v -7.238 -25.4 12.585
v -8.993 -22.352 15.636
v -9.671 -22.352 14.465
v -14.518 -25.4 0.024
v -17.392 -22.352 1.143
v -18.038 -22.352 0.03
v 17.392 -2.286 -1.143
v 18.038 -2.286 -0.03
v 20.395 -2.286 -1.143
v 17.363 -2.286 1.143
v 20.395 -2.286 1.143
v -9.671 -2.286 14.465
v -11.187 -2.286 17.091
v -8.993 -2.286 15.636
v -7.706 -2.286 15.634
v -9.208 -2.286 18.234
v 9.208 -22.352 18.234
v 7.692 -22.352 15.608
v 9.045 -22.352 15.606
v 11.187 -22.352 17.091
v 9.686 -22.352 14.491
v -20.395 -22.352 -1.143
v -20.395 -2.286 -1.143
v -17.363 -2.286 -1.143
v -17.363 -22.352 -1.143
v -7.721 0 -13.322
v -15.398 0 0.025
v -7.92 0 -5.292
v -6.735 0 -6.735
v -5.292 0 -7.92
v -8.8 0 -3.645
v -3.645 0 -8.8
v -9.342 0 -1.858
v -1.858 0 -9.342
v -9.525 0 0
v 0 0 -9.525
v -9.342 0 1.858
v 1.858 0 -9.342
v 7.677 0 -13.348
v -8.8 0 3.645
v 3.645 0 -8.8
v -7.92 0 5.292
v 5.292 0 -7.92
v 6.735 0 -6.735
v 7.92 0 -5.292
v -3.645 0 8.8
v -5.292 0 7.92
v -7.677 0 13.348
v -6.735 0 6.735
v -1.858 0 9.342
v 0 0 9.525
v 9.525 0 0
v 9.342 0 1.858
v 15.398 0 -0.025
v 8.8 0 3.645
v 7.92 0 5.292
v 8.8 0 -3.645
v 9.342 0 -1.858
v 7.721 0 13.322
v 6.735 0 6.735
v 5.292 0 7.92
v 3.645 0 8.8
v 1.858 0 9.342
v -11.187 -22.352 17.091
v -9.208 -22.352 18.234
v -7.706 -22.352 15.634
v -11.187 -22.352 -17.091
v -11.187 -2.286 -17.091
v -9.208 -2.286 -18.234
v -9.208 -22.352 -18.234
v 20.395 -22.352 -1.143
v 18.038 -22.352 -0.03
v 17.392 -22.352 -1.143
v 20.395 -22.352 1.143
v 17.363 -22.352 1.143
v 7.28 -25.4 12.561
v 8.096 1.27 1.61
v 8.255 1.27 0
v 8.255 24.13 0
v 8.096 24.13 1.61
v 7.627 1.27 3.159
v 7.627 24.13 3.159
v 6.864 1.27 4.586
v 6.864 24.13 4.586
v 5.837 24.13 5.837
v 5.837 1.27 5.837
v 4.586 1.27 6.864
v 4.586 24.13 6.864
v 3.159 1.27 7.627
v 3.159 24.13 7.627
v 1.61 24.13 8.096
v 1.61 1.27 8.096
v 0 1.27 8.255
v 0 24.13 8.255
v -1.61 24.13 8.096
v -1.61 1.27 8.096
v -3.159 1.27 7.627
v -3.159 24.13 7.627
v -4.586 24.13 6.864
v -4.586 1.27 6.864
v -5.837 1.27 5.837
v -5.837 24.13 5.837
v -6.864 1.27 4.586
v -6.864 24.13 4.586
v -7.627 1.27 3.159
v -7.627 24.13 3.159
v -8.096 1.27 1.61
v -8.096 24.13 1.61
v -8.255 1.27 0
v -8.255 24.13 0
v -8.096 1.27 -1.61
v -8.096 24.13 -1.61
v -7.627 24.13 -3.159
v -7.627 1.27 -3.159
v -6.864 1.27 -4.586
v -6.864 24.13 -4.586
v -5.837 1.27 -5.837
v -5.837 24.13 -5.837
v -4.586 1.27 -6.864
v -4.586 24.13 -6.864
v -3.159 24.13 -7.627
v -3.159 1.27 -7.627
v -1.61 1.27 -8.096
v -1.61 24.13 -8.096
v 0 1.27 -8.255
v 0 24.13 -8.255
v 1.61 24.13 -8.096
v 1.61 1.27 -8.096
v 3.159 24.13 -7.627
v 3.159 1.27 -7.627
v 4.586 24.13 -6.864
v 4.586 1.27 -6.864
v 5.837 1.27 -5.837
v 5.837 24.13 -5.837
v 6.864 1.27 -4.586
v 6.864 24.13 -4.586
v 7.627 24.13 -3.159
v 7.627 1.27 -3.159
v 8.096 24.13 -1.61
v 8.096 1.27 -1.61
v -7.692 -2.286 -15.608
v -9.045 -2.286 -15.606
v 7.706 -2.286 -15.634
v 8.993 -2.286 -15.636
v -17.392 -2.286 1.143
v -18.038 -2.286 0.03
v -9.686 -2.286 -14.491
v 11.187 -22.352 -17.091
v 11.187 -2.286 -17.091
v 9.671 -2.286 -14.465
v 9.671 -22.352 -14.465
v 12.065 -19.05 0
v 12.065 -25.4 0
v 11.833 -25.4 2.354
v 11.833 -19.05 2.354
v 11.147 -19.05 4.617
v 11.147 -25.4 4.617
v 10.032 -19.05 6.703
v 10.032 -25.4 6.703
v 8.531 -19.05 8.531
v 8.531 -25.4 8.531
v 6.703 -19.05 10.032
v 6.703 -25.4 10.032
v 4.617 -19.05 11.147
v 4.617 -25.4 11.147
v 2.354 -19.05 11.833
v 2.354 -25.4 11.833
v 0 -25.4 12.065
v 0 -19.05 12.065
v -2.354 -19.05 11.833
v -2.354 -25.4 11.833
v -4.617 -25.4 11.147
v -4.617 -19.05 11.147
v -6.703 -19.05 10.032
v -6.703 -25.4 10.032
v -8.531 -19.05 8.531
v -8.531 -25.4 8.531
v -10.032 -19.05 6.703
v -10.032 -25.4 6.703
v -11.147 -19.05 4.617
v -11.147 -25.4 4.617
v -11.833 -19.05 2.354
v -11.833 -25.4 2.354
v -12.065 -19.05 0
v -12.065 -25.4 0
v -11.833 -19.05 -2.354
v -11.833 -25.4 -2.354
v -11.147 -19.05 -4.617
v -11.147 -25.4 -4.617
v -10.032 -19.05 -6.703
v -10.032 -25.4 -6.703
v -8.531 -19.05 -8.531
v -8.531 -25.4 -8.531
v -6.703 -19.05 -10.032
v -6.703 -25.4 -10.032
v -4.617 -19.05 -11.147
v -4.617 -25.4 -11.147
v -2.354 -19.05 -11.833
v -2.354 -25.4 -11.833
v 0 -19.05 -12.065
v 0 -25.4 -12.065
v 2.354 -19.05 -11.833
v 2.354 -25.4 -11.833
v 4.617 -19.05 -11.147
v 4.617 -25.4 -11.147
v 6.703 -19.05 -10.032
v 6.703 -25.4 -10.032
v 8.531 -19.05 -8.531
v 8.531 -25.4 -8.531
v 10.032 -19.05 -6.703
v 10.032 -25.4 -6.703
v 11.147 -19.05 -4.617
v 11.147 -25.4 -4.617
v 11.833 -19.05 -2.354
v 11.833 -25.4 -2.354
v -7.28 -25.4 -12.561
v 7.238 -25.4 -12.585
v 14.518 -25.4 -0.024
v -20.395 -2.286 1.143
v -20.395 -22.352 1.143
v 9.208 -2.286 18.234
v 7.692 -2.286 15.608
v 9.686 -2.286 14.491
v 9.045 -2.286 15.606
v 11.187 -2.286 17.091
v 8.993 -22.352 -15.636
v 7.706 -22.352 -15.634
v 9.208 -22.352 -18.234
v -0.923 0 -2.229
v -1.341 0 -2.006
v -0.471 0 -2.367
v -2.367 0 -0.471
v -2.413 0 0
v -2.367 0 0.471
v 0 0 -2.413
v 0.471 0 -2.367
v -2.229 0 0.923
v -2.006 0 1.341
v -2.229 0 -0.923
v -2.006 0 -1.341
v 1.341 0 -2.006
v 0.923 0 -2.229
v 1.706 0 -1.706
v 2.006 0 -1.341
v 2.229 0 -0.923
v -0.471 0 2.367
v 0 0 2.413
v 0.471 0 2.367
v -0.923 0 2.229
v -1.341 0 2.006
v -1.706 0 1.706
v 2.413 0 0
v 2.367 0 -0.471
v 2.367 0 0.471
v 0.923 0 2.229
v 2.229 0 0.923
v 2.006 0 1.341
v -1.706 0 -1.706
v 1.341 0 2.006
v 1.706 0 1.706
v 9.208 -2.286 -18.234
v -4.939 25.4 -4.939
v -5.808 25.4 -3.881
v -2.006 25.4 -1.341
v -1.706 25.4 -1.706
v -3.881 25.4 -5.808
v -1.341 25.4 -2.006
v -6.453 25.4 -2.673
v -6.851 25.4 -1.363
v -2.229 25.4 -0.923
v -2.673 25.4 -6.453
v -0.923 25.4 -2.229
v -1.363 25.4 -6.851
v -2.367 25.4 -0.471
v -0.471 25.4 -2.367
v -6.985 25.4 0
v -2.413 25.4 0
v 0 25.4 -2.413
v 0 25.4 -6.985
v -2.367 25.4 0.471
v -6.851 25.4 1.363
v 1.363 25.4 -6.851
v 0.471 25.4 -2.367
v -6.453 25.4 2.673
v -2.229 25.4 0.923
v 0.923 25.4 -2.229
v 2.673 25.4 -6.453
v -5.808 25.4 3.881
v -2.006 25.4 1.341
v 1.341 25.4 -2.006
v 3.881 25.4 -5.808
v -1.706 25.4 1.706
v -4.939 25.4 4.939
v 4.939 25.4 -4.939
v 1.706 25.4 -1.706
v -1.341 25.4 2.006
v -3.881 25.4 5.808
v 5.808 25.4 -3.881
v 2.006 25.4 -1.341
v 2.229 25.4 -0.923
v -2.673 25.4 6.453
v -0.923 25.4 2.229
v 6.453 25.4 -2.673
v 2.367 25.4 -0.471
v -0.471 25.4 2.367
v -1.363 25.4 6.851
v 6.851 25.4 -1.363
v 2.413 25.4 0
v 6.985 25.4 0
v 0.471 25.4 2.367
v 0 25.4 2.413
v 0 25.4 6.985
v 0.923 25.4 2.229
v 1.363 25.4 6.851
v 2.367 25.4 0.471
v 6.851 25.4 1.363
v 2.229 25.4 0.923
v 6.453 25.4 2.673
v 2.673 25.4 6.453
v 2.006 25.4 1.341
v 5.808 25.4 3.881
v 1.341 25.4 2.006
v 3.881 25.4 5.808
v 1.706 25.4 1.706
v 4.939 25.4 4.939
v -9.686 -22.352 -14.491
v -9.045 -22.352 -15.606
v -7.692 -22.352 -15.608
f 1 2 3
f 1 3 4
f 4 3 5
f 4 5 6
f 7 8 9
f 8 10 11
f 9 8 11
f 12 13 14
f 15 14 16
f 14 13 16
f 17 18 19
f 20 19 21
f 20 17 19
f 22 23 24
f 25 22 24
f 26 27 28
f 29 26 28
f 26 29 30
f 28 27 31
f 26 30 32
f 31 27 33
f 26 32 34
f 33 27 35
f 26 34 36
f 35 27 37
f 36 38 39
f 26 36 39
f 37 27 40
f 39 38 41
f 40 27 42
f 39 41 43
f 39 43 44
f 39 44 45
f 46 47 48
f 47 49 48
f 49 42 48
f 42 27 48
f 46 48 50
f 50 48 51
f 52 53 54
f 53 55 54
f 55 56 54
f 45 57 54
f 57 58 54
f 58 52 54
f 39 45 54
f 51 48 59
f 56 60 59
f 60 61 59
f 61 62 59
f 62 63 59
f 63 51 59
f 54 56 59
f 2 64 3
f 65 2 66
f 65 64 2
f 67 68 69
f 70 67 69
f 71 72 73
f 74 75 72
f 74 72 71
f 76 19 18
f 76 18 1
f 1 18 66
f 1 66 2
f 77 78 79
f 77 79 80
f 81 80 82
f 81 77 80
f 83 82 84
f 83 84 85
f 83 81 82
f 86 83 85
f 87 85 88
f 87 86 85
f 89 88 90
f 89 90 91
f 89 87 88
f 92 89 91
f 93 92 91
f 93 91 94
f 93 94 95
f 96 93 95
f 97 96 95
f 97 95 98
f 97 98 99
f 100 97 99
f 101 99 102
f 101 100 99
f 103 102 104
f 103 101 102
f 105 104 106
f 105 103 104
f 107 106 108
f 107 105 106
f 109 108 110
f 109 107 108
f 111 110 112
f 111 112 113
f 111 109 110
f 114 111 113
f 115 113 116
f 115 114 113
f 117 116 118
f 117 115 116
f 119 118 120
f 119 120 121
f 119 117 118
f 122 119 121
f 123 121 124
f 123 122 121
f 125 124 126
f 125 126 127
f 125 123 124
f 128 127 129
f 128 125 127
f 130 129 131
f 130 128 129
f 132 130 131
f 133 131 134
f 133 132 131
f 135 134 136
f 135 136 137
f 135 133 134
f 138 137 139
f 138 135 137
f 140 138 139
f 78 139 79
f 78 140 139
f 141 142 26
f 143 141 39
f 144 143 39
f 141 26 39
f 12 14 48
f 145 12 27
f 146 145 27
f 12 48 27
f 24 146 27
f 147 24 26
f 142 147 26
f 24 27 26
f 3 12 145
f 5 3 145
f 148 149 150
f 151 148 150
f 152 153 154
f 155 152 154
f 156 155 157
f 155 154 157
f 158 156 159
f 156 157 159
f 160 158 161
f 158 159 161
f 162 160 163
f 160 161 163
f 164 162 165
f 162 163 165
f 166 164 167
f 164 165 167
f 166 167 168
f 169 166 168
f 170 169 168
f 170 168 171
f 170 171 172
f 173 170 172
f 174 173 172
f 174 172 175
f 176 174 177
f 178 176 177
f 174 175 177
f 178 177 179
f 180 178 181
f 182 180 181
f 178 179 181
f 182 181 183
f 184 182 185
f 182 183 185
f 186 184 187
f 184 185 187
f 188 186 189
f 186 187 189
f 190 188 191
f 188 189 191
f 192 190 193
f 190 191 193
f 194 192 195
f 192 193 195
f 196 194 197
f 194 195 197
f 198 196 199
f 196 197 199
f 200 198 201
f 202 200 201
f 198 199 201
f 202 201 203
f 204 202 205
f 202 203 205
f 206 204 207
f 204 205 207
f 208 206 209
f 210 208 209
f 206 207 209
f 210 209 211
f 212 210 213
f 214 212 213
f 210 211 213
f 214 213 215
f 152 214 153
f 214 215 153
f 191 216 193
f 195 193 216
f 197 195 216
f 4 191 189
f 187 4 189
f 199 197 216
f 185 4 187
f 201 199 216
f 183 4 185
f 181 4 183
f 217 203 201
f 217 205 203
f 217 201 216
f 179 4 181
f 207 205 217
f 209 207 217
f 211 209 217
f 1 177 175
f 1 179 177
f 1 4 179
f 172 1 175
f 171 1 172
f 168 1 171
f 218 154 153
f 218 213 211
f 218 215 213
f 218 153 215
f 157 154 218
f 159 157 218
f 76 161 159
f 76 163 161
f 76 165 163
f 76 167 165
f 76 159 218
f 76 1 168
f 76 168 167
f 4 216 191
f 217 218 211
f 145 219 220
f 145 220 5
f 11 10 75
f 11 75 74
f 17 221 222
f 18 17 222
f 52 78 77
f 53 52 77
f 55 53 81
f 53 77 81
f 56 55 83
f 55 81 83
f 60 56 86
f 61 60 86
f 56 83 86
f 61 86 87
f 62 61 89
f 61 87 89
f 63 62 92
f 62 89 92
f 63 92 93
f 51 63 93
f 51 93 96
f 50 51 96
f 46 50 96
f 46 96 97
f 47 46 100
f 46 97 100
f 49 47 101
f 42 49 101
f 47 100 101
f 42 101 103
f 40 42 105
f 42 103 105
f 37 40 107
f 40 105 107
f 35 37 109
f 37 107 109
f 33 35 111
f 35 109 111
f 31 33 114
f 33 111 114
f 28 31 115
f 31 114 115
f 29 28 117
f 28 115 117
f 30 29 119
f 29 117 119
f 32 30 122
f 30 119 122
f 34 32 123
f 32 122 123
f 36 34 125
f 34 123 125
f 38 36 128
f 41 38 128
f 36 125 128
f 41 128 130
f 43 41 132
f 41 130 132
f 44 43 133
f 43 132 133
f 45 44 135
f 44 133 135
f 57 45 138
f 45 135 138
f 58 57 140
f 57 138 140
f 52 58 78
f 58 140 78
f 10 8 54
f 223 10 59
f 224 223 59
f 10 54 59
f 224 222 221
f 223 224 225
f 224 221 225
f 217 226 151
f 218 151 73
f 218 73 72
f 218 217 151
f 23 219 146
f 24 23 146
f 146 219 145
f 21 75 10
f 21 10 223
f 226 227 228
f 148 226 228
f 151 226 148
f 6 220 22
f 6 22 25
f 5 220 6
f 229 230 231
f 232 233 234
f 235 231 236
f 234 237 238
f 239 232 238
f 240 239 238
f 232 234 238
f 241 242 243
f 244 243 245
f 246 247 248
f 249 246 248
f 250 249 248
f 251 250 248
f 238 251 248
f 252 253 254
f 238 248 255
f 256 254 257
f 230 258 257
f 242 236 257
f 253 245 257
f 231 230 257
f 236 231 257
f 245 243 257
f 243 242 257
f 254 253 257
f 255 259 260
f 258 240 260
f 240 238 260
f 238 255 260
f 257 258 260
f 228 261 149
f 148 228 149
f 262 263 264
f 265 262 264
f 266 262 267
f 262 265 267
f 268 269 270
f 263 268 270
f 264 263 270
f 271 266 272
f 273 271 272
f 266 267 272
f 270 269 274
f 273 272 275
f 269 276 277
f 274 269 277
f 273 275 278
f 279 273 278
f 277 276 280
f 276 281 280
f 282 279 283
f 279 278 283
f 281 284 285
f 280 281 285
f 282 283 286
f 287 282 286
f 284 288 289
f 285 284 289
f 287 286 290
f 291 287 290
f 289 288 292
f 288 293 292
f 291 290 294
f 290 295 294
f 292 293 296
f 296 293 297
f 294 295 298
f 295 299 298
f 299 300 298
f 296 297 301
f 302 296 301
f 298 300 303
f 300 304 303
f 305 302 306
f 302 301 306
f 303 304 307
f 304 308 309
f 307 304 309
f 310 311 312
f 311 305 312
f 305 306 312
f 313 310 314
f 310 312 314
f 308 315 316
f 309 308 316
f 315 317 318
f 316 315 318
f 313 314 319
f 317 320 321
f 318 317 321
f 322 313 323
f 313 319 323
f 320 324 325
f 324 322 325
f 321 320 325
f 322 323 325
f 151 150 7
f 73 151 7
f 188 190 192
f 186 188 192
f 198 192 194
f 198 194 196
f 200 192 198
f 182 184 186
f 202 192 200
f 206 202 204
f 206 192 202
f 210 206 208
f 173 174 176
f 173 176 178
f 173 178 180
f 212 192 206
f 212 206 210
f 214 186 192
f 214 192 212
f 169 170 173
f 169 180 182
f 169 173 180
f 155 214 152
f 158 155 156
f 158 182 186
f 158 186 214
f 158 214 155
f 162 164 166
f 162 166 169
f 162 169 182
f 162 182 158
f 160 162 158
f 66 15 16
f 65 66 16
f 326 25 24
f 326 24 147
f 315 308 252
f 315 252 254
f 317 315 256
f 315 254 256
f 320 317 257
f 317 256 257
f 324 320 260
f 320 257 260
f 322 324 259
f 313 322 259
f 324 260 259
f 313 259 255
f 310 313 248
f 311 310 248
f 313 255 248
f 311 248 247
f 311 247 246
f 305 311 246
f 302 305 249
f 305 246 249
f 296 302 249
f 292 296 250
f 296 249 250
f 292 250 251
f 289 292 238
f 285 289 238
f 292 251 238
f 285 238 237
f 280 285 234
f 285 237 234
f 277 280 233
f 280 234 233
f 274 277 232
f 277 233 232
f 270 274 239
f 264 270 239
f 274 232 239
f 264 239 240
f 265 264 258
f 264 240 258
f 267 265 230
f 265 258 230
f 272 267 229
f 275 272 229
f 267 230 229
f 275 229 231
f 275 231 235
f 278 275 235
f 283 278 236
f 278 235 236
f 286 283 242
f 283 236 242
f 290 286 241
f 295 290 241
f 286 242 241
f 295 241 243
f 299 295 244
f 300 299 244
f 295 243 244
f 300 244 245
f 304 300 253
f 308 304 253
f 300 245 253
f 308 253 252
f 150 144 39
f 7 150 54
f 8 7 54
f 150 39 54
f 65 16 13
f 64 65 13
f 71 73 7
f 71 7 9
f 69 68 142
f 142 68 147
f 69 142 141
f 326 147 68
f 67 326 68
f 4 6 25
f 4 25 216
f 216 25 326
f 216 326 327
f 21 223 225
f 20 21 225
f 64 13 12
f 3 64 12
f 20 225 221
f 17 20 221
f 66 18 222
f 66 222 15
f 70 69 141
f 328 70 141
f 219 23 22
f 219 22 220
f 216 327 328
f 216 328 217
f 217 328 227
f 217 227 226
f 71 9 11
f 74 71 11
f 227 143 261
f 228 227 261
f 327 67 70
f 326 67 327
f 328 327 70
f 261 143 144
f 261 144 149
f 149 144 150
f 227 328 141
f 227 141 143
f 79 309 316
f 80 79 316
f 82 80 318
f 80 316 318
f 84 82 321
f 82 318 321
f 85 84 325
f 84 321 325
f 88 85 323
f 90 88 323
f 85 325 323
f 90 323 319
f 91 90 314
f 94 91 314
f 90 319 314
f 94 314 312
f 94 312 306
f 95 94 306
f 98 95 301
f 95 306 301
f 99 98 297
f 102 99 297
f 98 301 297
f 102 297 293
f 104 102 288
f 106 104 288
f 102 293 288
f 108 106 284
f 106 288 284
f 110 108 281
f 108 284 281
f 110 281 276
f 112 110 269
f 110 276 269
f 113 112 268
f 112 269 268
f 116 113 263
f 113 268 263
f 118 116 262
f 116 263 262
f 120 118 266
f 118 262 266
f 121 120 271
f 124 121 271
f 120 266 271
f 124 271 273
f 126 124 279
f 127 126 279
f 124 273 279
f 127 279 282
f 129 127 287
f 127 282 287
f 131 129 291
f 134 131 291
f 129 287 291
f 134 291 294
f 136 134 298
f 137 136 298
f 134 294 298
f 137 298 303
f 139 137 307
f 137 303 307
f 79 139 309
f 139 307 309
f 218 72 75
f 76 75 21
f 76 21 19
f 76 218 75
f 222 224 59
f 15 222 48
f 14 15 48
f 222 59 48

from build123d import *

# Parameters (mm, degrees)
F1_DEPTH  = 25.4
F4_SIZE   = 2.286
F5_SIZE   = 3.048
F3_W      = 3.048
F3_H      = 2.286
F6_DEPTH  = 20.066
F7_R      = 8.255
F9_DEPTH  = 25.4
F8_R      = 2.413
F10_DEPTH = 25.4
F11_SIZE  = 1.27
F13_R     = 12.065
F14_DEPTH = 6.35


with BuildPart() as f1:
    # F0 (on Front) → F1 (new body)
    with BuildSketch(Plane.XZ):
        Polygon((18.037553, -0.029708), (9.044504, 15.606125), (-8.993048, 15.635833), (-18.037553, 0.029708), (-9.044504, -15.606125), (8.993048, -15.635833), align=None)
    extrude(amount=F1_DEPTH)

    # F4
    f4_edges = [f1.edges().sort_by_distance(p)[0] for p in [
        (13.541028, 0, 7.788208),
        (0.025728, 0, 15.620979),
        (-13.515301, 0, 7.83277),
        (-13.541028, 0, -7.788208),
        (-0.025728, 0, -15.620979),
        (13.515301, 0, -7.83277),
    ]]
    chamfer(f4_edges, length=F4_SIZE)

    # F5
    f5_edges = [f1.edges().sort_by_distance(p)[0] for p in [
        (13.541028, -25.4, 7.788208),
        (0.025728, -25.4, 15.620979),
        (-13.515301, -25.4, 7.83277),
        (-13.541028, -25.4, -7.788208),
        (-0.025728, -25.4, -15.620979),
        (13.515301, -25.4, -7.83277),
    ]]
    chamfer(f5_edges, length=F5_SIZE)

    # F3 (on offset) → F6 (join)
    with BuildSketch(Plane.XZ.offset(2.286)):
        with Locations((18.87098, 0)):
            Rectangle(F3_W, F3_H)
        Polygon((9.207623, 18.234071), (7.683623, 15.594425), (9.663357, 14.451425), (11.187357, 17.091071), align=None)
        Polygon((-11.187357, 17.091071), (-9.663357, 14.451425), (-7.683623, 15.594425), (-9.207623, 18.234071), align=None)
        with Locations((-18.87098, 0)):
            Rectangle(F3_W, F3_H)
        Polygon((-9.207623, -18.234071), (-7.683623, -15.594425), (-9.663357, -14.451425), (-11.187357, -17.091071), align=None)
        Polygon((11.187357, -17.091071), (9.663357, -14.451425), (7.683623, -15.594425), (9.207623, -18.234071), align=None)
    extrude(amount=F6_DEPTH)

    # F7 (on Front) → F9 (join)
    with BuildSketch(Plane.XZ):
        Circle(F7_R)
    extrude(amount=-F9_DEPTH)

    # F8 (on Front) → F10 (cut)
    with BuildSketch(Plane.XZ):
        Circle(F8_R)
    extrude(amount=-F10_DEPTH, mode=Mode.SUBTRACT)

    # F11
    f11_edges = [f1.edges().sort_by_distance(p)[0] for p in [
        (8.255, 12.7, 0),
        (-8.255, 0, 0),
        (-8.255, 25.4, 0),
    ]]
    chamfer(f11_edges, length=F11_SIZE)

    # F13 (on offset) → F14 (cut)
    with BuildSketch(Plane.XZ.offset(25.4)):
        Circle(F13_R)
    extrude(amount=-F14_DEPTH, mode=Mode.SUBTRACT)


solid = f1.part
